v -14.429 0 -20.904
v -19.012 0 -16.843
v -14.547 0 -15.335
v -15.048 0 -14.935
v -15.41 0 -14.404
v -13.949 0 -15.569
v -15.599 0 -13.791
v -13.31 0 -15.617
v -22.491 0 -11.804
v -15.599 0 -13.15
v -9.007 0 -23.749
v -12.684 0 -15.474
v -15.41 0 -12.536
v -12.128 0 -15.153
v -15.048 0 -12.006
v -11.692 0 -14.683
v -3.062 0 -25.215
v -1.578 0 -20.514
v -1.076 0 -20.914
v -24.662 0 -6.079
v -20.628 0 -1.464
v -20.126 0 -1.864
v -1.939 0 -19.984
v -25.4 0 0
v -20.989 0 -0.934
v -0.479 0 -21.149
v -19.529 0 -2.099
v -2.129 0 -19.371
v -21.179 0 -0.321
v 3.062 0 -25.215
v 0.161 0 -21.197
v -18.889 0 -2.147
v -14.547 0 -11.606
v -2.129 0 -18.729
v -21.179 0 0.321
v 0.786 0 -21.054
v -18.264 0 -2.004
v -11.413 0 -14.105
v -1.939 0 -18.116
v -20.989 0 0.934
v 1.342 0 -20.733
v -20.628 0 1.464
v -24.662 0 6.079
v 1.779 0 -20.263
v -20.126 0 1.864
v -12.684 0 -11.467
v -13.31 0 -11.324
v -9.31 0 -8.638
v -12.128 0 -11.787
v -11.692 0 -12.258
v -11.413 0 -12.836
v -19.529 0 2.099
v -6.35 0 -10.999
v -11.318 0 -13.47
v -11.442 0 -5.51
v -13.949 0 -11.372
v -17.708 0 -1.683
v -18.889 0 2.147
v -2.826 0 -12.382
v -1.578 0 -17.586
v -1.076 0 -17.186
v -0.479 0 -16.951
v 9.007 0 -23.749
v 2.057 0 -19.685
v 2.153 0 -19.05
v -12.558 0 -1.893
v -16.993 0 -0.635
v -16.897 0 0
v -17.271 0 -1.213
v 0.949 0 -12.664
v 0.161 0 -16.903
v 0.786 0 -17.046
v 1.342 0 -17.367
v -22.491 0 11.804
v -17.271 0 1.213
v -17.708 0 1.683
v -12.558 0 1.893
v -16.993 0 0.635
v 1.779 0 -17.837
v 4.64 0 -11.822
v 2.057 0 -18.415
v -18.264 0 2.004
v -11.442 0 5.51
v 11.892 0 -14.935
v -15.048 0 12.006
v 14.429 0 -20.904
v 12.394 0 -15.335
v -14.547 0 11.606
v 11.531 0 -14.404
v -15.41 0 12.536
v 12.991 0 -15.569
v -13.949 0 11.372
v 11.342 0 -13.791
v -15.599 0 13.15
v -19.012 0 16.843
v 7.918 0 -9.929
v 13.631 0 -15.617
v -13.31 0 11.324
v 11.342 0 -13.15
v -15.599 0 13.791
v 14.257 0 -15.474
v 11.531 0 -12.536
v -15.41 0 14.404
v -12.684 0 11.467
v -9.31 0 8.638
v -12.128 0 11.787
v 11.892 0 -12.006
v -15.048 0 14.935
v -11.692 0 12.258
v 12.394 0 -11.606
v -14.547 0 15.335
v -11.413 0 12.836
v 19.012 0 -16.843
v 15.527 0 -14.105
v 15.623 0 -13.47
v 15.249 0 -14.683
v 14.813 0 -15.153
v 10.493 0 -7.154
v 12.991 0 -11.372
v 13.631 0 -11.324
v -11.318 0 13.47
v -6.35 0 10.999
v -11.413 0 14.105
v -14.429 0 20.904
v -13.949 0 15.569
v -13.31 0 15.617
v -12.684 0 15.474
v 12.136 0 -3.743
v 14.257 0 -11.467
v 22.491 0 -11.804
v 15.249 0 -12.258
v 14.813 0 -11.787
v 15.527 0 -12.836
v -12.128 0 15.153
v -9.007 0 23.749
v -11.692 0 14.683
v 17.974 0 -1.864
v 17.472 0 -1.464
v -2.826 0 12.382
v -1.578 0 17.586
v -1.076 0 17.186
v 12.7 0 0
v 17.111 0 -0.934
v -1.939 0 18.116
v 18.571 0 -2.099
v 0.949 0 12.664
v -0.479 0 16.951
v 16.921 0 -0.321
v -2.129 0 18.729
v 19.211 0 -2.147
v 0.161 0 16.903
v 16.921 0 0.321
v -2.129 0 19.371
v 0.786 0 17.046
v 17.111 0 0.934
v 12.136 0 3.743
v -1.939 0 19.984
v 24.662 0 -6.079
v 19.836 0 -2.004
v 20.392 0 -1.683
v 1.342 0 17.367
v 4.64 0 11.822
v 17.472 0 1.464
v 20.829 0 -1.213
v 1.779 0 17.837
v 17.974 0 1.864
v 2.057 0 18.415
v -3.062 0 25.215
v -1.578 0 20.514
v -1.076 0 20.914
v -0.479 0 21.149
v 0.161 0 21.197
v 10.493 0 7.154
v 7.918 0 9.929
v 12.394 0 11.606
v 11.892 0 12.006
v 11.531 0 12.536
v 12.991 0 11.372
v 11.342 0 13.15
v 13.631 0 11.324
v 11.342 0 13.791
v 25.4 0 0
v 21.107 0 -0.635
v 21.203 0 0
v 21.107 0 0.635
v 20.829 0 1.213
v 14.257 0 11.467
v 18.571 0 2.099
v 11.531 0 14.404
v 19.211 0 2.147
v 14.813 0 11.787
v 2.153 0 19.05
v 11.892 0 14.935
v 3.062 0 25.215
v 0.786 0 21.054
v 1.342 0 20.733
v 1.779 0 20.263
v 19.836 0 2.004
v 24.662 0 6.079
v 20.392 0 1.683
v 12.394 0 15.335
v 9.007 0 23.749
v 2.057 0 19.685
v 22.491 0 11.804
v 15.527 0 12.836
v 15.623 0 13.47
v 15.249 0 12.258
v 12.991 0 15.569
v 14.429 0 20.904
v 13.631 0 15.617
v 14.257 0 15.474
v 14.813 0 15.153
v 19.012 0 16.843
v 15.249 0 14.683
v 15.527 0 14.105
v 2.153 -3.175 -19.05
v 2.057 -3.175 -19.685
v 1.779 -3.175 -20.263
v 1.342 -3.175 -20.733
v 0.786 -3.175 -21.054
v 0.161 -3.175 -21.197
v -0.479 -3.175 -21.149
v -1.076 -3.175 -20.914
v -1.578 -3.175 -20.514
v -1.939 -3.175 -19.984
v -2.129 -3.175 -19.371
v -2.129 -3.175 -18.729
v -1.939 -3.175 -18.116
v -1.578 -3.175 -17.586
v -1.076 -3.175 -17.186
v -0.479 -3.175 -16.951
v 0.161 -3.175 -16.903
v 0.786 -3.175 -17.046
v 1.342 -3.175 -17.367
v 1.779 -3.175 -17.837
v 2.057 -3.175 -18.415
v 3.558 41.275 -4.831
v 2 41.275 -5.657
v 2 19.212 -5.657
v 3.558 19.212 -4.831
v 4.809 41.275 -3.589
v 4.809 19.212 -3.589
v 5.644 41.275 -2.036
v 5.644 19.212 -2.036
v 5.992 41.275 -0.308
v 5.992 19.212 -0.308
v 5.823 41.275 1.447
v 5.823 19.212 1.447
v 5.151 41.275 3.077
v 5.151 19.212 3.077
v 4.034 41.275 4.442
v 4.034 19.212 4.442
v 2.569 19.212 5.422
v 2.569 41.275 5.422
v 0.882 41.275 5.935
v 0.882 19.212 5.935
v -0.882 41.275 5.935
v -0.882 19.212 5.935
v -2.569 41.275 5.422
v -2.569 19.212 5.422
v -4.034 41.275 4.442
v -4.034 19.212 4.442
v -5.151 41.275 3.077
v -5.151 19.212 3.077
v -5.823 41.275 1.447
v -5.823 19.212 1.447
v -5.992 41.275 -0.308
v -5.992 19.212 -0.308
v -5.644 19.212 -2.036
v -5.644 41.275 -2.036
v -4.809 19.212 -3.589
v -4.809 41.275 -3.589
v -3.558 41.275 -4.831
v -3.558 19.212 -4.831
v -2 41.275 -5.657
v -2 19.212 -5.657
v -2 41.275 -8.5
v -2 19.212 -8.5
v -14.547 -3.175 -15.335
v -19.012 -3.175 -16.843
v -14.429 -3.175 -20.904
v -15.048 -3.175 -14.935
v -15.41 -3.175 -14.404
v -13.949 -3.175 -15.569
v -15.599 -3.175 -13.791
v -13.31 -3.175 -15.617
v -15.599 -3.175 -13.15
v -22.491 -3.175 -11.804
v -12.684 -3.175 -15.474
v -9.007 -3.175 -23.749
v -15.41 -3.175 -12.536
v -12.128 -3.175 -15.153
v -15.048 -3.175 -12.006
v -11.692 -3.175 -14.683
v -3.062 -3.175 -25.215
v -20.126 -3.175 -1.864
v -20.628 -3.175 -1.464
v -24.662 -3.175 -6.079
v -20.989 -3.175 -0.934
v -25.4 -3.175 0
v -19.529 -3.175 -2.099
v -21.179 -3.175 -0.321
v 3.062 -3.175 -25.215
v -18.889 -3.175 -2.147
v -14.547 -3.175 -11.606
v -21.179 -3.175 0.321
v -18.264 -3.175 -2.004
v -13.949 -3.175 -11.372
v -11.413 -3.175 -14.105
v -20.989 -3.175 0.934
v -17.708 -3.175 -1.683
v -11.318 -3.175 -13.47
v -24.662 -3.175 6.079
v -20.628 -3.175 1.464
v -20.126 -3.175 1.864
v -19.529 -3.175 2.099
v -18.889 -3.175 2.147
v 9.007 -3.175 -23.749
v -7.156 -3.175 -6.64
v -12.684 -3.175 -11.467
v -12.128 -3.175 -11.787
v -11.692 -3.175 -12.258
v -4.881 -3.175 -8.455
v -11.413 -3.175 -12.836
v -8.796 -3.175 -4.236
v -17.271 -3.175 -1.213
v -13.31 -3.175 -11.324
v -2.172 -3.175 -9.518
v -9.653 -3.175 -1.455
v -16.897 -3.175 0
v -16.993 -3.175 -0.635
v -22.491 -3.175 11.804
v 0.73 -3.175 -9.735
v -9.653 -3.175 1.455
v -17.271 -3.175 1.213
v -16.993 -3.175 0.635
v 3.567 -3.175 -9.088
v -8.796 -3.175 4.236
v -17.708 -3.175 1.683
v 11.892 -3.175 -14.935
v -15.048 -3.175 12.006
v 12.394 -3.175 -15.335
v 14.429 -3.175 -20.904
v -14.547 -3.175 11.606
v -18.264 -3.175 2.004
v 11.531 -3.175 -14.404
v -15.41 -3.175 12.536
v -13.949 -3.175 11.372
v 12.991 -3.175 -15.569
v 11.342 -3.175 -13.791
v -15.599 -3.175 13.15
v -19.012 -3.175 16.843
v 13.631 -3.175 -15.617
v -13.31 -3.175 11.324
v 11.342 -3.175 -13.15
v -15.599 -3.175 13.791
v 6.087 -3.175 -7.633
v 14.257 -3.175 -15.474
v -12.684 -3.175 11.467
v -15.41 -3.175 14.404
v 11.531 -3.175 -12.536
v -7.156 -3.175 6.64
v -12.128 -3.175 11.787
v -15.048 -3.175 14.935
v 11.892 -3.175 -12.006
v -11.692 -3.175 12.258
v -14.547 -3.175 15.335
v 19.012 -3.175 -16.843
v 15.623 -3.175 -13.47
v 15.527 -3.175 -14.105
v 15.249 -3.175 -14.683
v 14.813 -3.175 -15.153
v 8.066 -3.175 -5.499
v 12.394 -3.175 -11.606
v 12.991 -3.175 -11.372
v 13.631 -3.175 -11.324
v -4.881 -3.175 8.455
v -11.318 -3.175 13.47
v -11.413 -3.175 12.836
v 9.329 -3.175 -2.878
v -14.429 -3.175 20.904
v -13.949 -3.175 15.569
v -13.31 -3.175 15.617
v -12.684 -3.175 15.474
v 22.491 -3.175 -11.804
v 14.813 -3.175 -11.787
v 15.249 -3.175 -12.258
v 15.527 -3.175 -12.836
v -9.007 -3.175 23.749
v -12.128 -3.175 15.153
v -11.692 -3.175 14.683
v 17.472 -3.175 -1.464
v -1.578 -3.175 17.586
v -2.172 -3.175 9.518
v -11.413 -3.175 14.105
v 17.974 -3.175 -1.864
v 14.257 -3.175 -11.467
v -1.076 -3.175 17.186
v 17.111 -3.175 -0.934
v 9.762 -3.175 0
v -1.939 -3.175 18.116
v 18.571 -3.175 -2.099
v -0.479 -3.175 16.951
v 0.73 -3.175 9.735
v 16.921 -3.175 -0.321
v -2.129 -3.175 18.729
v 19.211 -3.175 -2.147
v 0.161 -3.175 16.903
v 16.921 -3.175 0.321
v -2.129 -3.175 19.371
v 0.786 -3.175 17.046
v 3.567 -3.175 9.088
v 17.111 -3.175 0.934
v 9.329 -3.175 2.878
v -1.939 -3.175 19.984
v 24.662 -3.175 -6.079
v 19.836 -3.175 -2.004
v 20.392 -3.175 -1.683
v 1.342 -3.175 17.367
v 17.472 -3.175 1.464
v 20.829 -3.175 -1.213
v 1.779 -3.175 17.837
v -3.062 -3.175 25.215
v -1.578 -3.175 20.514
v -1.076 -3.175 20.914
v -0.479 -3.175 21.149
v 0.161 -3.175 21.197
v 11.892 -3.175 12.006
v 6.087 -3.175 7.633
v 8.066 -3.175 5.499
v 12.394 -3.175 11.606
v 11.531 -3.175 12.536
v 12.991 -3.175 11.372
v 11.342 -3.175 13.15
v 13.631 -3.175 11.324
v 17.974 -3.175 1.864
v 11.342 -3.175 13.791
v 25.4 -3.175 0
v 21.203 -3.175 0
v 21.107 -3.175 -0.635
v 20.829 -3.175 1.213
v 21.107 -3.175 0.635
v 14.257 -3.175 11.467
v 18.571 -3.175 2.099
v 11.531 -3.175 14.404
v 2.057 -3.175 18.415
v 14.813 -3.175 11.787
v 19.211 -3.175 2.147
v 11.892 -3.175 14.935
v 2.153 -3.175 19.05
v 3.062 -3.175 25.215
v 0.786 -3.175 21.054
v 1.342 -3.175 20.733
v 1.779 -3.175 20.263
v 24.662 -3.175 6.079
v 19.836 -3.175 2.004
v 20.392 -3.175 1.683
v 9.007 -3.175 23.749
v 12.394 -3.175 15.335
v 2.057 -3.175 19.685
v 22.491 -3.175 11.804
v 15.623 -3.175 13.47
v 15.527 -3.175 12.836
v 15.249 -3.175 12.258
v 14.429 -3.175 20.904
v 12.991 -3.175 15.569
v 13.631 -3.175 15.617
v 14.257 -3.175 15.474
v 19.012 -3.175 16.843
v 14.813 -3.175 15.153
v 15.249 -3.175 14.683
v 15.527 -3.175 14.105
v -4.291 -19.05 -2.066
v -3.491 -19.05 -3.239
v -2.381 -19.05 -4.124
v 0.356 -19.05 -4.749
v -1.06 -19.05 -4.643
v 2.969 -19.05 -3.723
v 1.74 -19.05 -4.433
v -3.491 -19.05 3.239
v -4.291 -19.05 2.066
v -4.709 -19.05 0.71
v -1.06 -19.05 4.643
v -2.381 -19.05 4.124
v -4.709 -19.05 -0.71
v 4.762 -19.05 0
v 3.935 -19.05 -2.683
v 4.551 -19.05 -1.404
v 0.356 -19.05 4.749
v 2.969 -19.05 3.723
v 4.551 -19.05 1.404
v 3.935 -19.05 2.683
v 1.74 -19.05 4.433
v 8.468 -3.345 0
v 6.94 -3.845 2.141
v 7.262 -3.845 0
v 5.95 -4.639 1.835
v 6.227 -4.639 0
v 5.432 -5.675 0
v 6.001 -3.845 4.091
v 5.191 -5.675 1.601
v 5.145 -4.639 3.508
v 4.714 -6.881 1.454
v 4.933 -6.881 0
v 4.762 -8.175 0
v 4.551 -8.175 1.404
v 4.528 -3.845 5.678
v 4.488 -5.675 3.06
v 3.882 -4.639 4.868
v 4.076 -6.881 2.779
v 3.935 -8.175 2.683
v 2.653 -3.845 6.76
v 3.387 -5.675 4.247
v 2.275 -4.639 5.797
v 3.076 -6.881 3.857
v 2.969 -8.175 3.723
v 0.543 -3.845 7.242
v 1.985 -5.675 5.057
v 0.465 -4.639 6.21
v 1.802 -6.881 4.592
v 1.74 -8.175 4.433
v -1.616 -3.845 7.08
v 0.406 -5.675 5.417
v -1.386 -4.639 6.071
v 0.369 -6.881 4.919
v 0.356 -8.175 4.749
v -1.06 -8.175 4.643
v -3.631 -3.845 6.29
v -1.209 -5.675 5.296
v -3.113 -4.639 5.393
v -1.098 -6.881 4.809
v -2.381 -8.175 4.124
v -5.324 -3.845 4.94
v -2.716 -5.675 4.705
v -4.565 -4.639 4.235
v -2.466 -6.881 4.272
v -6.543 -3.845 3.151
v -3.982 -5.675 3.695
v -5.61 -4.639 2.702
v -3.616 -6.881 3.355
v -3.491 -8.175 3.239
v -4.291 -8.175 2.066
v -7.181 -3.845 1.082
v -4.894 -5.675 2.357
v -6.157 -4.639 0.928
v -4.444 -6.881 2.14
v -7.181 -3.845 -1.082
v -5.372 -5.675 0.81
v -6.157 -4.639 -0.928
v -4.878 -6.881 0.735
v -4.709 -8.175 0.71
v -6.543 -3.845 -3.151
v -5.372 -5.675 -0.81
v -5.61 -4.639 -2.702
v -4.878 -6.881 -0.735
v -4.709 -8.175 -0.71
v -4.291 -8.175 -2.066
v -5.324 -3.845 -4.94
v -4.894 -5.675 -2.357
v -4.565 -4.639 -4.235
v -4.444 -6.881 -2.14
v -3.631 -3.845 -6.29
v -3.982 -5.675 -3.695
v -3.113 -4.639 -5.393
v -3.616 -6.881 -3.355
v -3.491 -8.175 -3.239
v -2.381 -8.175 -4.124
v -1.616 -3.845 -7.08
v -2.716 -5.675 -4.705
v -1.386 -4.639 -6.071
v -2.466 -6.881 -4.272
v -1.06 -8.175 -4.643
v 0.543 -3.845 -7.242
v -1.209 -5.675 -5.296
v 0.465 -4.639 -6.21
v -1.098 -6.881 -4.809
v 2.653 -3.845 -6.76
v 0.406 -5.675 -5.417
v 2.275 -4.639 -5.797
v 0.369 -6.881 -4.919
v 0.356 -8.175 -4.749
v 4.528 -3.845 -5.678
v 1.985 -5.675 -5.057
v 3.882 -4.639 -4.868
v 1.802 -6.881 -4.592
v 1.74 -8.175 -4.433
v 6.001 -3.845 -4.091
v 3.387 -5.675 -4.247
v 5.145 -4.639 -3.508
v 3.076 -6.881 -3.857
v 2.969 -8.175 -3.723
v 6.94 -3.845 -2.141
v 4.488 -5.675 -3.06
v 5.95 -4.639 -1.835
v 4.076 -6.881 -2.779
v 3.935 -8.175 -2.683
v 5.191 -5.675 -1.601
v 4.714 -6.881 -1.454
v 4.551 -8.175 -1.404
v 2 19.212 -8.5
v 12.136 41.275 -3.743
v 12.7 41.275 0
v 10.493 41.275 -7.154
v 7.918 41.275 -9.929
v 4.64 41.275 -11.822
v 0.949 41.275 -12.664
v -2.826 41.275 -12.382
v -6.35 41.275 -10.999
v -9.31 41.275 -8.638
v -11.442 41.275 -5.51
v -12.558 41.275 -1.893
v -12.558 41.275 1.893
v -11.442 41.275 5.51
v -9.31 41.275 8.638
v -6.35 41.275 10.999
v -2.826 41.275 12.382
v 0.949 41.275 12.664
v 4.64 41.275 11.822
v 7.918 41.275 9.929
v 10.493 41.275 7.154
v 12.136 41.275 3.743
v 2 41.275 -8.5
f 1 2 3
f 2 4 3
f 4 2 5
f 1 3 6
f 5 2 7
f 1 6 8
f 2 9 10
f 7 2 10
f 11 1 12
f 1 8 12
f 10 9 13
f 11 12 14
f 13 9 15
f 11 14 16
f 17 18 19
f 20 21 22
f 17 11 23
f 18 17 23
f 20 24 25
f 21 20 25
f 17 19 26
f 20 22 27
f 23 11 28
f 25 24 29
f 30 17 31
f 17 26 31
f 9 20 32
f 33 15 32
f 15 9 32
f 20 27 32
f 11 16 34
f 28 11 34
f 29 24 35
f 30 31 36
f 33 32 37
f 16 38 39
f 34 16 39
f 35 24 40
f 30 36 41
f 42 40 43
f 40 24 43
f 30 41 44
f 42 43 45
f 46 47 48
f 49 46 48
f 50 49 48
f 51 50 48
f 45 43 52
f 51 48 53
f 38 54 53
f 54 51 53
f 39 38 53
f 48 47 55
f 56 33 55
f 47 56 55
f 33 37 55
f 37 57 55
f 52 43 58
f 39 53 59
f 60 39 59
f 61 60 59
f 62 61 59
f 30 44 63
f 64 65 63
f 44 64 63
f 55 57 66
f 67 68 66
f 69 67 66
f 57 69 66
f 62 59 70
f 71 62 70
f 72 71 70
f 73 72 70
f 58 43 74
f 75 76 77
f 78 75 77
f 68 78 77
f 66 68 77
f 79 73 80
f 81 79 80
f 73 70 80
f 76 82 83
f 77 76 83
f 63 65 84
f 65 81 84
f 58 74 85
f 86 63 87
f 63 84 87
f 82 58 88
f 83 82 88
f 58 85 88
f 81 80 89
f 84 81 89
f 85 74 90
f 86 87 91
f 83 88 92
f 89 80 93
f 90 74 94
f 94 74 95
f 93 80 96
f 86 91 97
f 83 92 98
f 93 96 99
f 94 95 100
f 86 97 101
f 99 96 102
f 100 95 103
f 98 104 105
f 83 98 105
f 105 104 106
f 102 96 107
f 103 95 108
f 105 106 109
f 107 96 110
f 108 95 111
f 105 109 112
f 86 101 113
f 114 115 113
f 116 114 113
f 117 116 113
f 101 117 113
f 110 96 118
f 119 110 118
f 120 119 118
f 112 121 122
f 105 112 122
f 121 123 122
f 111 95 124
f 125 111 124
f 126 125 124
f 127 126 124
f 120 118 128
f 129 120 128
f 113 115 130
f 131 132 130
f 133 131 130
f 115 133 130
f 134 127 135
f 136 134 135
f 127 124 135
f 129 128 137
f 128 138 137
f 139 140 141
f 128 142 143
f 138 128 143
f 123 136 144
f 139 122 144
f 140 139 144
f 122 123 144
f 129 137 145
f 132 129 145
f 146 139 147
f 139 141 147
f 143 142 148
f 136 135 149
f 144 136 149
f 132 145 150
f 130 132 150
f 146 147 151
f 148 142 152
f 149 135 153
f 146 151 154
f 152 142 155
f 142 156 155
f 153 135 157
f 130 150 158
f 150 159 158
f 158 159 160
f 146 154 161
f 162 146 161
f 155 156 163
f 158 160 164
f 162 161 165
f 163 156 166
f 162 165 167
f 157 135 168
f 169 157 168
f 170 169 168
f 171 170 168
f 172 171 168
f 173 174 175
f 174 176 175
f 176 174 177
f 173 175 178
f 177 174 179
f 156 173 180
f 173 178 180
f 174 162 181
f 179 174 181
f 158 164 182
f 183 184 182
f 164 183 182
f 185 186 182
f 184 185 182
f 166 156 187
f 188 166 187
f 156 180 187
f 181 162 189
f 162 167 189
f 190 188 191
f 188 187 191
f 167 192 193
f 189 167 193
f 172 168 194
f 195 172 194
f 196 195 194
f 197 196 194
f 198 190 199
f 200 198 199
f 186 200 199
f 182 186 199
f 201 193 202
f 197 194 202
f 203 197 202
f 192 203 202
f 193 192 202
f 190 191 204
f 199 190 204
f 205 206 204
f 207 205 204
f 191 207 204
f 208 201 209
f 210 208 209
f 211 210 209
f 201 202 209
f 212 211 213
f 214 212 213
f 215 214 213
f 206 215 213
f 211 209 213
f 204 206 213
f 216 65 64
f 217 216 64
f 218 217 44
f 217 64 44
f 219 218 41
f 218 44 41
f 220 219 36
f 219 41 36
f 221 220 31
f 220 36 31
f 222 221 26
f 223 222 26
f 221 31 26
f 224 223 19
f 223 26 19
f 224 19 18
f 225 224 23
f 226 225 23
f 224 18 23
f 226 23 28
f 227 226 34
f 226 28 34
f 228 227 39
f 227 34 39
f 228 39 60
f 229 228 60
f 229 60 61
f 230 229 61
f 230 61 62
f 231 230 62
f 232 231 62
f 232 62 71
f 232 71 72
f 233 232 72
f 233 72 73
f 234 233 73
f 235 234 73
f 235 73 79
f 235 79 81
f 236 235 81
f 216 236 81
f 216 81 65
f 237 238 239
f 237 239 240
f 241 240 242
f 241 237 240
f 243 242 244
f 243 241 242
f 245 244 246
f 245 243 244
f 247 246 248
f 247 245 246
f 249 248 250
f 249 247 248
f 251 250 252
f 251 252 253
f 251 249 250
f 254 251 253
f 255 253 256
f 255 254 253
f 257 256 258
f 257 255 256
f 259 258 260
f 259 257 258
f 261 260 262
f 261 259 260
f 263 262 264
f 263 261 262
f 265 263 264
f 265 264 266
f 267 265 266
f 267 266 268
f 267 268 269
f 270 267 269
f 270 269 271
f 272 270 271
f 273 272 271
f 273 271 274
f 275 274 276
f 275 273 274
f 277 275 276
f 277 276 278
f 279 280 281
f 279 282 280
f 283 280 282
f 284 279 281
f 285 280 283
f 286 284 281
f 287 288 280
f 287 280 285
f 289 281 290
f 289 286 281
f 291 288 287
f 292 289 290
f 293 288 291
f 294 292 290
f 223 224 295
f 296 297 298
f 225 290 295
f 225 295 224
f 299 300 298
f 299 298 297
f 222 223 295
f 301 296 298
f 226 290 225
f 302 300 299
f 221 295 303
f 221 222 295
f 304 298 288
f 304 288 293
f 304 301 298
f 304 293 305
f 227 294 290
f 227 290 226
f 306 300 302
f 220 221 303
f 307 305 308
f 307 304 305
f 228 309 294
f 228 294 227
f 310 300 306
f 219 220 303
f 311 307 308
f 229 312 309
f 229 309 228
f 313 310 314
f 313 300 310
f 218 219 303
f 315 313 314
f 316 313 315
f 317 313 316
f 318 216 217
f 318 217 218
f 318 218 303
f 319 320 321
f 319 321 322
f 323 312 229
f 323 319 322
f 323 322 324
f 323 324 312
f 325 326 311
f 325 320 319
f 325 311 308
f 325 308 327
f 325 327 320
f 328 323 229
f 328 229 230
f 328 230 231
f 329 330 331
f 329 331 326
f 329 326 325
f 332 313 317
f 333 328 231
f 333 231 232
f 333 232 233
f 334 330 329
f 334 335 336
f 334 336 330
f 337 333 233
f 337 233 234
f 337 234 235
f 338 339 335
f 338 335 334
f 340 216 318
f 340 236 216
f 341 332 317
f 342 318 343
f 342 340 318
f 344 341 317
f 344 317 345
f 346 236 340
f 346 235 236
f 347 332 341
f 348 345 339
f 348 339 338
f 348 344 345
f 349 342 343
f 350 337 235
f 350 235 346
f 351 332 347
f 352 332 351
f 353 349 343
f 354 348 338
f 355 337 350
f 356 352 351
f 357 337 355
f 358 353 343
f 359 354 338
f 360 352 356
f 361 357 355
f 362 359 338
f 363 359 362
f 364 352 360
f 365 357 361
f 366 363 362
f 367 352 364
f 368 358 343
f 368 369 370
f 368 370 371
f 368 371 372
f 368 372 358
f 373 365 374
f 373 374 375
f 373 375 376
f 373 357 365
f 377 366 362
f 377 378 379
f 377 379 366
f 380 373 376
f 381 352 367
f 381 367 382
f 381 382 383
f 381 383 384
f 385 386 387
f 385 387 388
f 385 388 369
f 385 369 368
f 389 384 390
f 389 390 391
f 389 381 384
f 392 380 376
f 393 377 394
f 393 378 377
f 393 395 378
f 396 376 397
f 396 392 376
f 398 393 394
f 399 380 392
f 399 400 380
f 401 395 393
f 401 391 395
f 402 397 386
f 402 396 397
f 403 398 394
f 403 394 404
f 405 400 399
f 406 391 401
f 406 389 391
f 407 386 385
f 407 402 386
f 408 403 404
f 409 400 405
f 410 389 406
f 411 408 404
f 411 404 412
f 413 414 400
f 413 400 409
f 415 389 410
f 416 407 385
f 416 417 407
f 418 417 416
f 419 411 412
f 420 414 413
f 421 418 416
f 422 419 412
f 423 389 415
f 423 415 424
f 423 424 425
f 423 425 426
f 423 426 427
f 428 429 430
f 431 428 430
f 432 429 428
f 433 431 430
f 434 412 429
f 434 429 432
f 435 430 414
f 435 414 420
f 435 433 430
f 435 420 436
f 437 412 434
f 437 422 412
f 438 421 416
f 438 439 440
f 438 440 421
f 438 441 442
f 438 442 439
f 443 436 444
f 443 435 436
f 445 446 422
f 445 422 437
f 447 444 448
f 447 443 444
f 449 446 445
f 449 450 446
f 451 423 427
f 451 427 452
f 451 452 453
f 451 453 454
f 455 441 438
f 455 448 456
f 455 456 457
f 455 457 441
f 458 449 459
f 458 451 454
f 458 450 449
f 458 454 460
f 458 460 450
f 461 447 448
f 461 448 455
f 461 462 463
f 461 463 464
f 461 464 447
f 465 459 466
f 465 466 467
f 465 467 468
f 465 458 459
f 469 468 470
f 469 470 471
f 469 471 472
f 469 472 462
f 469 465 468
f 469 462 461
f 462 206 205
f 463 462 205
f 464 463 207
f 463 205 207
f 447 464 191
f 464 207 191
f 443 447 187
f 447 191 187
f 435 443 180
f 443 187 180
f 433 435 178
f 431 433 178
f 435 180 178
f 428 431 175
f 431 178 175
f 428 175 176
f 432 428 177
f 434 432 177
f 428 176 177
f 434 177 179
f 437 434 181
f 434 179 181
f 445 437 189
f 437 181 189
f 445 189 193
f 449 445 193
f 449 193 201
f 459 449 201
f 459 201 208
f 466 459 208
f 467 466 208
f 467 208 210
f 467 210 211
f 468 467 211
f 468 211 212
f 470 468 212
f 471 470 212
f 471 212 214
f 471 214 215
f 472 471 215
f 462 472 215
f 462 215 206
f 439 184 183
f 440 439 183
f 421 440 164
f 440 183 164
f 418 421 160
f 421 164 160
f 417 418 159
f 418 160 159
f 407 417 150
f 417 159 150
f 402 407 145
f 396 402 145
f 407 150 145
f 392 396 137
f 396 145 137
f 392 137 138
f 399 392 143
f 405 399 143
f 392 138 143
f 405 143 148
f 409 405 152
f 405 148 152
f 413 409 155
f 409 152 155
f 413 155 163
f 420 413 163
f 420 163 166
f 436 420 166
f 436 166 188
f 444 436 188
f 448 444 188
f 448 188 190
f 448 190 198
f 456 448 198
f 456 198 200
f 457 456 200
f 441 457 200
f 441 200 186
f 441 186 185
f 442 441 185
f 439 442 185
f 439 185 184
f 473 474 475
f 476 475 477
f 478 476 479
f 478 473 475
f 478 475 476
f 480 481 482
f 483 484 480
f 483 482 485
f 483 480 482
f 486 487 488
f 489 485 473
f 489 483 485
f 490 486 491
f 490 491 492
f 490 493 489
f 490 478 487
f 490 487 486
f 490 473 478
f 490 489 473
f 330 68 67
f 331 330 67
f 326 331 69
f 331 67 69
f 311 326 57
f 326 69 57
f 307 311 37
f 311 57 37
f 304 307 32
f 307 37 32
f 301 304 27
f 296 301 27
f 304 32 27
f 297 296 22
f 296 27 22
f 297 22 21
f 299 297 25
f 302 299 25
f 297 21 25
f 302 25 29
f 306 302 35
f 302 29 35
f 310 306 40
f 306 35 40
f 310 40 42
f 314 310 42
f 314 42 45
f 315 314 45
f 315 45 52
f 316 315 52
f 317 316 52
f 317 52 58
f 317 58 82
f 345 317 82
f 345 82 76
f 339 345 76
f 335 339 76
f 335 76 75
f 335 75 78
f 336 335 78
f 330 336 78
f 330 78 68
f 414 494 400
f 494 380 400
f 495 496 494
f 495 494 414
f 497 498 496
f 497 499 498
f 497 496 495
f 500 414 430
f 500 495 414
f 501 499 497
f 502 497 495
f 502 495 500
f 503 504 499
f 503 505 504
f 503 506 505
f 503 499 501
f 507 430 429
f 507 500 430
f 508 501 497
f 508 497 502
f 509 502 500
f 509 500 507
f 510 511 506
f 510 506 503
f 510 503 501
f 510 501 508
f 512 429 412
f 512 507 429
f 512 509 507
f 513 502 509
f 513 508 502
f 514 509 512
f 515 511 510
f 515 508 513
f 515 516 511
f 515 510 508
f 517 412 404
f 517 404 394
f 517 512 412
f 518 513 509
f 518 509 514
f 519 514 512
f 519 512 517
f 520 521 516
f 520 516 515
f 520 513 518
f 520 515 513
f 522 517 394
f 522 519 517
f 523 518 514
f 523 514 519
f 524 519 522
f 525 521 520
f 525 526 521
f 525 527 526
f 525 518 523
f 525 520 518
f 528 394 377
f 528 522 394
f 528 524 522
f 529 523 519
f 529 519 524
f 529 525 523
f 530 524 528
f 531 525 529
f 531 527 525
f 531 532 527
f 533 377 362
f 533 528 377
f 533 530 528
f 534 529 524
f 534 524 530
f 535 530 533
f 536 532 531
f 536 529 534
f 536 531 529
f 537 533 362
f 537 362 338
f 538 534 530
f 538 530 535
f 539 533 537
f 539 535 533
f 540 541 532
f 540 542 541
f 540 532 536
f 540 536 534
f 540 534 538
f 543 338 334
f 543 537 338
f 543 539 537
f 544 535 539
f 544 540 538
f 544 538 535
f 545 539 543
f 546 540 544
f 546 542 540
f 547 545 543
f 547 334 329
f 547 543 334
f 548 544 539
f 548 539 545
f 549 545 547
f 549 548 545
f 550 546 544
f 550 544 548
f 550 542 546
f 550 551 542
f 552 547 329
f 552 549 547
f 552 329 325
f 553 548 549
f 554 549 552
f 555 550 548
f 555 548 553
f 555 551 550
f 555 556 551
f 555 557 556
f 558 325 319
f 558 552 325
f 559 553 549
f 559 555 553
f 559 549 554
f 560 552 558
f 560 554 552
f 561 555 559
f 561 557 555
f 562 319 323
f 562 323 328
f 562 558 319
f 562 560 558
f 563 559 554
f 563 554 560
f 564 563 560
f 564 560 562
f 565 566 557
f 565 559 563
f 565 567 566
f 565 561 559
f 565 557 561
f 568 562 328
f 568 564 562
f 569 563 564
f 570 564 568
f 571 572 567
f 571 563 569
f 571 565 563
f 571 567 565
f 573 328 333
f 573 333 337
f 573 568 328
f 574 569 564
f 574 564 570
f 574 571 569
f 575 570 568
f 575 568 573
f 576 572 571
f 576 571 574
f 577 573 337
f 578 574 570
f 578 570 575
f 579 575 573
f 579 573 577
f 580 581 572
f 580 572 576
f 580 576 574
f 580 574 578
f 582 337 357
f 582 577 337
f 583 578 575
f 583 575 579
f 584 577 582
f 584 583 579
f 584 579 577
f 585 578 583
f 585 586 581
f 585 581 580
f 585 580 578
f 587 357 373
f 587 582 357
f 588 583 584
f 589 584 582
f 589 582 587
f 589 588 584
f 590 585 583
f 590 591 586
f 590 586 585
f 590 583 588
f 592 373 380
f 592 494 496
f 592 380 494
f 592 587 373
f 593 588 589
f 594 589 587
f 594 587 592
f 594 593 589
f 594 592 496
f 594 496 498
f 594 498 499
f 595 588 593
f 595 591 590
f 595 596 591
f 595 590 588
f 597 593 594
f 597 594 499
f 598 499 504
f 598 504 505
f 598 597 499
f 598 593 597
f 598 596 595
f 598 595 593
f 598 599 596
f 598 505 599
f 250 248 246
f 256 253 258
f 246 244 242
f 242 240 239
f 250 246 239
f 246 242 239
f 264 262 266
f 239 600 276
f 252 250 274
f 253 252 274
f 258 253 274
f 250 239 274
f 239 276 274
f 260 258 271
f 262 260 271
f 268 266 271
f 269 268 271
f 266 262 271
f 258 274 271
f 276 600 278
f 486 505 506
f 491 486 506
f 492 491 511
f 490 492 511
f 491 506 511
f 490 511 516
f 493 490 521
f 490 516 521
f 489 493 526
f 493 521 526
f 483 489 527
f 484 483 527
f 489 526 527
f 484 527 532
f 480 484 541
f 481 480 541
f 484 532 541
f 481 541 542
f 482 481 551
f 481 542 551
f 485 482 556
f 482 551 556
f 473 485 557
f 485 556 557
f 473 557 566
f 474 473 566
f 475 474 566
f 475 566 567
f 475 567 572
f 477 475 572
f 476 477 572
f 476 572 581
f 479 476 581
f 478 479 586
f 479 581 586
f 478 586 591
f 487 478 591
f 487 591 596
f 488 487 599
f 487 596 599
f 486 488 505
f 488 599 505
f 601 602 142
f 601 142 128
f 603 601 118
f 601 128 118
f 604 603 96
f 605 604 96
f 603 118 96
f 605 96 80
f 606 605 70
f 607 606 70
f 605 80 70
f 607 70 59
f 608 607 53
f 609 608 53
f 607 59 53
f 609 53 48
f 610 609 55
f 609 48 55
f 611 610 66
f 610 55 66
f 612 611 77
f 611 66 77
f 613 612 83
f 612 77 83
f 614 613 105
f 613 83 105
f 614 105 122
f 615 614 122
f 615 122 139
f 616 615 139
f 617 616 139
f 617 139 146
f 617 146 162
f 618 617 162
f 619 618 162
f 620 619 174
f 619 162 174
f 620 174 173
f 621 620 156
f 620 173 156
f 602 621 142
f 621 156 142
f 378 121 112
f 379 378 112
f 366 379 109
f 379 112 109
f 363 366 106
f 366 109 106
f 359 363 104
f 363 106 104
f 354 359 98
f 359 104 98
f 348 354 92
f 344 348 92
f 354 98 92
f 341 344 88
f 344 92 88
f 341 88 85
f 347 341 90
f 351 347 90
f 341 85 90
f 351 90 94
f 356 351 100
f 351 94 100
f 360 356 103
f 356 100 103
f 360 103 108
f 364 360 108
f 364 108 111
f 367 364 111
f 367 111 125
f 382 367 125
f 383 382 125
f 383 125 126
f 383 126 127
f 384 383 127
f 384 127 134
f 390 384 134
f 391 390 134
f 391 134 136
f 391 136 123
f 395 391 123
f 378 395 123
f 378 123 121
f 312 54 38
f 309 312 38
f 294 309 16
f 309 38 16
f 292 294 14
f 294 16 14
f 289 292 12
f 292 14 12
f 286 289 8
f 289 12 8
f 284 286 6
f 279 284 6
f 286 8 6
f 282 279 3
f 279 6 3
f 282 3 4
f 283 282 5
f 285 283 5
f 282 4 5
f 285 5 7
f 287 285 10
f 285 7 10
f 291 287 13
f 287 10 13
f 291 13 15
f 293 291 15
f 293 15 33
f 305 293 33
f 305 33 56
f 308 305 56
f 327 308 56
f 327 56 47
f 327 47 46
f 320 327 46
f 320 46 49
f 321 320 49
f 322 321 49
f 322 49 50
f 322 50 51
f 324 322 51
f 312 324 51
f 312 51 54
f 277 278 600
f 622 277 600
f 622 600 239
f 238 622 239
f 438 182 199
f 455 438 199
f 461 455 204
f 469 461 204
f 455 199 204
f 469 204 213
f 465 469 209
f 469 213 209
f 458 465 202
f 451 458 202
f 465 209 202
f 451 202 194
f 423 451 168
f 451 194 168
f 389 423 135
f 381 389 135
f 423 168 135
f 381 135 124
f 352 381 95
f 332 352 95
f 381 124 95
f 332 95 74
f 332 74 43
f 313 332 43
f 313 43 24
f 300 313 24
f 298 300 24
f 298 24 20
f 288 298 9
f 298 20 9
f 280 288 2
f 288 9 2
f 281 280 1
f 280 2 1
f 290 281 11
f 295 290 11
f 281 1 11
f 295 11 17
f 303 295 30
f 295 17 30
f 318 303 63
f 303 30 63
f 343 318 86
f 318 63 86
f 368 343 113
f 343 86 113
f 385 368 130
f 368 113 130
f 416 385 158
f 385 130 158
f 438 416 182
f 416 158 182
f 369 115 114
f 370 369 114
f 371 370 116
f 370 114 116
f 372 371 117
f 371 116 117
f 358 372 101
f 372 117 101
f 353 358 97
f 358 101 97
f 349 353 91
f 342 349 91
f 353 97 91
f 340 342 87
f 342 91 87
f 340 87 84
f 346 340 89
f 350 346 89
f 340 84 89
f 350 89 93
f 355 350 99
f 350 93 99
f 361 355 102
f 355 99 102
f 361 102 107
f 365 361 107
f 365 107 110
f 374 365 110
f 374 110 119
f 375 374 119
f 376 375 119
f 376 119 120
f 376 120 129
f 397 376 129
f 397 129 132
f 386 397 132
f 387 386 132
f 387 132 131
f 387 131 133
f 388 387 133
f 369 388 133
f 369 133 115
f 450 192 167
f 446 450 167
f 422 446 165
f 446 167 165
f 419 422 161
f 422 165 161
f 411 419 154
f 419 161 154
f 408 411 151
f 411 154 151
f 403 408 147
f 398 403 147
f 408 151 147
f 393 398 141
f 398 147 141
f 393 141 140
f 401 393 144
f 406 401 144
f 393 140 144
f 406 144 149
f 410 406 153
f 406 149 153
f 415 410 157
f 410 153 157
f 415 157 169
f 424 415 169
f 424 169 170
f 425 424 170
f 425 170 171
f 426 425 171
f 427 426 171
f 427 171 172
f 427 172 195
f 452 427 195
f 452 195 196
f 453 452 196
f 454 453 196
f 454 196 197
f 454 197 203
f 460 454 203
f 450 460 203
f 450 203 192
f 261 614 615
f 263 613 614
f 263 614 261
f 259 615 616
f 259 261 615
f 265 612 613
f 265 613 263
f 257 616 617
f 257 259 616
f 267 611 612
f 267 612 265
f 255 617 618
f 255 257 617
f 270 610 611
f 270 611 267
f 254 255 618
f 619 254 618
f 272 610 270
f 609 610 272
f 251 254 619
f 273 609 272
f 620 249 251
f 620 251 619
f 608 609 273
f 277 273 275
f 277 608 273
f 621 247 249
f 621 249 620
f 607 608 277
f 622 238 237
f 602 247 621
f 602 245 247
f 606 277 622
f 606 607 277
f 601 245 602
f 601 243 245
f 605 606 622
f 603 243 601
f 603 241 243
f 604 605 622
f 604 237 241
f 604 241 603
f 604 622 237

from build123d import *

# Parameters (mm, degrees)
SKETCH1_R                   = 12.7
BOSS_EXTRUDE1_DEPTH         = 41.275
SKETCH3_R                   = 25.4
BOSS_EXTRUDE3_DEPTH         = 3.175
F_8_CLEARANCE_HOLE1_D       = 4.3053
F_20_8MMTOENDOFKEYWAY_DEPTH = 22.0625
SKETCH8_R                   = 4.7625
BOSS_EXTRUDE4_DEPTH         = 15.875
FILLET1_R                   = 5


with BuildPart() as part:
    # Sketch1 → Boss-Extrude1 (new body)
    with BuildSketch(Plane(origin=(0, 0, 0), x_dir=(1, 0, 0), z_dir=(0, 1, 0))):
        Circle(SKETCH1_R)
    extrude(amount=BOSS_EXTRUDE1_DEPTH)

    # Sketch3 → Boss-Extrude3 (add)
    with BuildSketch(Plane.XZ):
        Circle(SKETCH3_R)
    extrude(amount=BOSS_EXTRUDE3_DEPTH)

    # #8 Clearance Hole1 (through all)
    with Locations(Plane(origin=(0, -3.175, 0), x_dir=(-1, 0, 0), z_dir=(0, -1, 0))):
        with Locations((0, 19.05), (-13.470384182, 13.470384182), (-19.05, 0), (-13.470384182, -13.470384182), (0, -19.05), (13.470384182, -13.470384182), (19.05, 0), (13.470384182, 13.470384182)):
            Hole(F_8_CLEARANCE_HOLE1_D / 2)

    # Sketch7 → 20.8mmToEndofKeyway (cut)
    with BuildSketch(Plane(origin=(0, 41.275, 0), x_dir=(1, 0, 0), z_dir=(0, 1, 0))):
        with BuildLine():
            Line((-2, 8.5), (2, 8.5))
            Line((2, 8.5), (2, 5.656854249))
            ThreePointArc((2, 5.656854249), (0, -6), (-2, 5.656854249))
            Line((-2, 5.656854249), (-2, 8.5))
        make_face()
    extrude(amount=-F_20_8MMTOENDOFKEYWAY_DEPTH, mode=Mode.SUBTRACT)

    # Sketch8 → Boss-Extrude4 (add)
    with BuildSketch(Plane.XZ.offset(3.175)):
        Circle(SKETCH8_R)
    extrude(amount=BOSS_EXTRUDE4_DEPTH)

    # Fillet1
    fillet1_edges = [part.edges().sort_by_distance(p)[0] for p in [
        (-4.7625, -3.175, 0),
    ]]
    fillet(fillet1_edges, radius=FILLET1_R)


solid = part.part
